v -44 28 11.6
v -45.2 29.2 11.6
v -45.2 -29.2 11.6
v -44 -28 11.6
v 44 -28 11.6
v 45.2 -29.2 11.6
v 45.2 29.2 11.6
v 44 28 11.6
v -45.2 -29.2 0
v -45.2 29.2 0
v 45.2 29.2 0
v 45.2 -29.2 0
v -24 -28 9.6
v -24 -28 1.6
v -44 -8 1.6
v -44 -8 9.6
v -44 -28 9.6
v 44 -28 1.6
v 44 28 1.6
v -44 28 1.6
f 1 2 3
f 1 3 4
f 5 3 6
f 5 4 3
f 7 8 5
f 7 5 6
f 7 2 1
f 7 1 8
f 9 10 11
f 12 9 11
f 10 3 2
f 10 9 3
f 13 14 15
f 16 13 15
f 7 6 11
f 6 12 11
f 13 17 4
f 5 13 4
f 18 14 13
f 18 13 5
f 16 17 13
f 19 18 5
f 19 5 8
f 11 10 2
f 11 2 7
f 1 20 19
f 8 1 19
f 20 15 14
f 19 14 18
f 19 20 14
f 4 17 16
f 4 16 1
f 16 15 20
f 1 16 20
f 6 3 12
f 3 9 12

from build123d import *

# Parameters (mm, degrees)
F0_W     = 90.4
F0_H     = 58.4
F0_W_2   = 88
F0_H_2   = 56
F1_DEPTH = 1.6
F2_W     = 90.4
F2_H     = 58.4
F2_W_2   = 88
F2_H_2   = 56
F3_DEPTH = 10
F5_DEPTH = 8


with BuildPart() as f1:
    # F0 (on Top) → F1 (new body)
    with BuildSketch(Plane.XY):
        Rectangle(F0_W, F0_H)
        Rectangle(F0_W_2, F0_H_2, mode=Mode.SUBTRACT)
        Rectangle(F0_W_2, F0_H_2)
    extrude(amount=F1_DEPTH)

    # F2 (on face) → F3 (join)
    with BuildSketch(Plane.XY.offset(1.6)):
        Rectangle(F2_W, F2_H)
        Rectangle(F2_W_2, F2_H_2, mode=Mode.SUBTRACT)
    extrude(amount=F3_DEPTH)

    # F4 (on face) → F5 (join)
    with BuildSketch(Plane.XY.offset(1.6)):
        Polygon((-24, -28), (-44, -8), (-44, -28), align=None)
    extrude(amount=F5_DEPTH)


solid = f1.part
